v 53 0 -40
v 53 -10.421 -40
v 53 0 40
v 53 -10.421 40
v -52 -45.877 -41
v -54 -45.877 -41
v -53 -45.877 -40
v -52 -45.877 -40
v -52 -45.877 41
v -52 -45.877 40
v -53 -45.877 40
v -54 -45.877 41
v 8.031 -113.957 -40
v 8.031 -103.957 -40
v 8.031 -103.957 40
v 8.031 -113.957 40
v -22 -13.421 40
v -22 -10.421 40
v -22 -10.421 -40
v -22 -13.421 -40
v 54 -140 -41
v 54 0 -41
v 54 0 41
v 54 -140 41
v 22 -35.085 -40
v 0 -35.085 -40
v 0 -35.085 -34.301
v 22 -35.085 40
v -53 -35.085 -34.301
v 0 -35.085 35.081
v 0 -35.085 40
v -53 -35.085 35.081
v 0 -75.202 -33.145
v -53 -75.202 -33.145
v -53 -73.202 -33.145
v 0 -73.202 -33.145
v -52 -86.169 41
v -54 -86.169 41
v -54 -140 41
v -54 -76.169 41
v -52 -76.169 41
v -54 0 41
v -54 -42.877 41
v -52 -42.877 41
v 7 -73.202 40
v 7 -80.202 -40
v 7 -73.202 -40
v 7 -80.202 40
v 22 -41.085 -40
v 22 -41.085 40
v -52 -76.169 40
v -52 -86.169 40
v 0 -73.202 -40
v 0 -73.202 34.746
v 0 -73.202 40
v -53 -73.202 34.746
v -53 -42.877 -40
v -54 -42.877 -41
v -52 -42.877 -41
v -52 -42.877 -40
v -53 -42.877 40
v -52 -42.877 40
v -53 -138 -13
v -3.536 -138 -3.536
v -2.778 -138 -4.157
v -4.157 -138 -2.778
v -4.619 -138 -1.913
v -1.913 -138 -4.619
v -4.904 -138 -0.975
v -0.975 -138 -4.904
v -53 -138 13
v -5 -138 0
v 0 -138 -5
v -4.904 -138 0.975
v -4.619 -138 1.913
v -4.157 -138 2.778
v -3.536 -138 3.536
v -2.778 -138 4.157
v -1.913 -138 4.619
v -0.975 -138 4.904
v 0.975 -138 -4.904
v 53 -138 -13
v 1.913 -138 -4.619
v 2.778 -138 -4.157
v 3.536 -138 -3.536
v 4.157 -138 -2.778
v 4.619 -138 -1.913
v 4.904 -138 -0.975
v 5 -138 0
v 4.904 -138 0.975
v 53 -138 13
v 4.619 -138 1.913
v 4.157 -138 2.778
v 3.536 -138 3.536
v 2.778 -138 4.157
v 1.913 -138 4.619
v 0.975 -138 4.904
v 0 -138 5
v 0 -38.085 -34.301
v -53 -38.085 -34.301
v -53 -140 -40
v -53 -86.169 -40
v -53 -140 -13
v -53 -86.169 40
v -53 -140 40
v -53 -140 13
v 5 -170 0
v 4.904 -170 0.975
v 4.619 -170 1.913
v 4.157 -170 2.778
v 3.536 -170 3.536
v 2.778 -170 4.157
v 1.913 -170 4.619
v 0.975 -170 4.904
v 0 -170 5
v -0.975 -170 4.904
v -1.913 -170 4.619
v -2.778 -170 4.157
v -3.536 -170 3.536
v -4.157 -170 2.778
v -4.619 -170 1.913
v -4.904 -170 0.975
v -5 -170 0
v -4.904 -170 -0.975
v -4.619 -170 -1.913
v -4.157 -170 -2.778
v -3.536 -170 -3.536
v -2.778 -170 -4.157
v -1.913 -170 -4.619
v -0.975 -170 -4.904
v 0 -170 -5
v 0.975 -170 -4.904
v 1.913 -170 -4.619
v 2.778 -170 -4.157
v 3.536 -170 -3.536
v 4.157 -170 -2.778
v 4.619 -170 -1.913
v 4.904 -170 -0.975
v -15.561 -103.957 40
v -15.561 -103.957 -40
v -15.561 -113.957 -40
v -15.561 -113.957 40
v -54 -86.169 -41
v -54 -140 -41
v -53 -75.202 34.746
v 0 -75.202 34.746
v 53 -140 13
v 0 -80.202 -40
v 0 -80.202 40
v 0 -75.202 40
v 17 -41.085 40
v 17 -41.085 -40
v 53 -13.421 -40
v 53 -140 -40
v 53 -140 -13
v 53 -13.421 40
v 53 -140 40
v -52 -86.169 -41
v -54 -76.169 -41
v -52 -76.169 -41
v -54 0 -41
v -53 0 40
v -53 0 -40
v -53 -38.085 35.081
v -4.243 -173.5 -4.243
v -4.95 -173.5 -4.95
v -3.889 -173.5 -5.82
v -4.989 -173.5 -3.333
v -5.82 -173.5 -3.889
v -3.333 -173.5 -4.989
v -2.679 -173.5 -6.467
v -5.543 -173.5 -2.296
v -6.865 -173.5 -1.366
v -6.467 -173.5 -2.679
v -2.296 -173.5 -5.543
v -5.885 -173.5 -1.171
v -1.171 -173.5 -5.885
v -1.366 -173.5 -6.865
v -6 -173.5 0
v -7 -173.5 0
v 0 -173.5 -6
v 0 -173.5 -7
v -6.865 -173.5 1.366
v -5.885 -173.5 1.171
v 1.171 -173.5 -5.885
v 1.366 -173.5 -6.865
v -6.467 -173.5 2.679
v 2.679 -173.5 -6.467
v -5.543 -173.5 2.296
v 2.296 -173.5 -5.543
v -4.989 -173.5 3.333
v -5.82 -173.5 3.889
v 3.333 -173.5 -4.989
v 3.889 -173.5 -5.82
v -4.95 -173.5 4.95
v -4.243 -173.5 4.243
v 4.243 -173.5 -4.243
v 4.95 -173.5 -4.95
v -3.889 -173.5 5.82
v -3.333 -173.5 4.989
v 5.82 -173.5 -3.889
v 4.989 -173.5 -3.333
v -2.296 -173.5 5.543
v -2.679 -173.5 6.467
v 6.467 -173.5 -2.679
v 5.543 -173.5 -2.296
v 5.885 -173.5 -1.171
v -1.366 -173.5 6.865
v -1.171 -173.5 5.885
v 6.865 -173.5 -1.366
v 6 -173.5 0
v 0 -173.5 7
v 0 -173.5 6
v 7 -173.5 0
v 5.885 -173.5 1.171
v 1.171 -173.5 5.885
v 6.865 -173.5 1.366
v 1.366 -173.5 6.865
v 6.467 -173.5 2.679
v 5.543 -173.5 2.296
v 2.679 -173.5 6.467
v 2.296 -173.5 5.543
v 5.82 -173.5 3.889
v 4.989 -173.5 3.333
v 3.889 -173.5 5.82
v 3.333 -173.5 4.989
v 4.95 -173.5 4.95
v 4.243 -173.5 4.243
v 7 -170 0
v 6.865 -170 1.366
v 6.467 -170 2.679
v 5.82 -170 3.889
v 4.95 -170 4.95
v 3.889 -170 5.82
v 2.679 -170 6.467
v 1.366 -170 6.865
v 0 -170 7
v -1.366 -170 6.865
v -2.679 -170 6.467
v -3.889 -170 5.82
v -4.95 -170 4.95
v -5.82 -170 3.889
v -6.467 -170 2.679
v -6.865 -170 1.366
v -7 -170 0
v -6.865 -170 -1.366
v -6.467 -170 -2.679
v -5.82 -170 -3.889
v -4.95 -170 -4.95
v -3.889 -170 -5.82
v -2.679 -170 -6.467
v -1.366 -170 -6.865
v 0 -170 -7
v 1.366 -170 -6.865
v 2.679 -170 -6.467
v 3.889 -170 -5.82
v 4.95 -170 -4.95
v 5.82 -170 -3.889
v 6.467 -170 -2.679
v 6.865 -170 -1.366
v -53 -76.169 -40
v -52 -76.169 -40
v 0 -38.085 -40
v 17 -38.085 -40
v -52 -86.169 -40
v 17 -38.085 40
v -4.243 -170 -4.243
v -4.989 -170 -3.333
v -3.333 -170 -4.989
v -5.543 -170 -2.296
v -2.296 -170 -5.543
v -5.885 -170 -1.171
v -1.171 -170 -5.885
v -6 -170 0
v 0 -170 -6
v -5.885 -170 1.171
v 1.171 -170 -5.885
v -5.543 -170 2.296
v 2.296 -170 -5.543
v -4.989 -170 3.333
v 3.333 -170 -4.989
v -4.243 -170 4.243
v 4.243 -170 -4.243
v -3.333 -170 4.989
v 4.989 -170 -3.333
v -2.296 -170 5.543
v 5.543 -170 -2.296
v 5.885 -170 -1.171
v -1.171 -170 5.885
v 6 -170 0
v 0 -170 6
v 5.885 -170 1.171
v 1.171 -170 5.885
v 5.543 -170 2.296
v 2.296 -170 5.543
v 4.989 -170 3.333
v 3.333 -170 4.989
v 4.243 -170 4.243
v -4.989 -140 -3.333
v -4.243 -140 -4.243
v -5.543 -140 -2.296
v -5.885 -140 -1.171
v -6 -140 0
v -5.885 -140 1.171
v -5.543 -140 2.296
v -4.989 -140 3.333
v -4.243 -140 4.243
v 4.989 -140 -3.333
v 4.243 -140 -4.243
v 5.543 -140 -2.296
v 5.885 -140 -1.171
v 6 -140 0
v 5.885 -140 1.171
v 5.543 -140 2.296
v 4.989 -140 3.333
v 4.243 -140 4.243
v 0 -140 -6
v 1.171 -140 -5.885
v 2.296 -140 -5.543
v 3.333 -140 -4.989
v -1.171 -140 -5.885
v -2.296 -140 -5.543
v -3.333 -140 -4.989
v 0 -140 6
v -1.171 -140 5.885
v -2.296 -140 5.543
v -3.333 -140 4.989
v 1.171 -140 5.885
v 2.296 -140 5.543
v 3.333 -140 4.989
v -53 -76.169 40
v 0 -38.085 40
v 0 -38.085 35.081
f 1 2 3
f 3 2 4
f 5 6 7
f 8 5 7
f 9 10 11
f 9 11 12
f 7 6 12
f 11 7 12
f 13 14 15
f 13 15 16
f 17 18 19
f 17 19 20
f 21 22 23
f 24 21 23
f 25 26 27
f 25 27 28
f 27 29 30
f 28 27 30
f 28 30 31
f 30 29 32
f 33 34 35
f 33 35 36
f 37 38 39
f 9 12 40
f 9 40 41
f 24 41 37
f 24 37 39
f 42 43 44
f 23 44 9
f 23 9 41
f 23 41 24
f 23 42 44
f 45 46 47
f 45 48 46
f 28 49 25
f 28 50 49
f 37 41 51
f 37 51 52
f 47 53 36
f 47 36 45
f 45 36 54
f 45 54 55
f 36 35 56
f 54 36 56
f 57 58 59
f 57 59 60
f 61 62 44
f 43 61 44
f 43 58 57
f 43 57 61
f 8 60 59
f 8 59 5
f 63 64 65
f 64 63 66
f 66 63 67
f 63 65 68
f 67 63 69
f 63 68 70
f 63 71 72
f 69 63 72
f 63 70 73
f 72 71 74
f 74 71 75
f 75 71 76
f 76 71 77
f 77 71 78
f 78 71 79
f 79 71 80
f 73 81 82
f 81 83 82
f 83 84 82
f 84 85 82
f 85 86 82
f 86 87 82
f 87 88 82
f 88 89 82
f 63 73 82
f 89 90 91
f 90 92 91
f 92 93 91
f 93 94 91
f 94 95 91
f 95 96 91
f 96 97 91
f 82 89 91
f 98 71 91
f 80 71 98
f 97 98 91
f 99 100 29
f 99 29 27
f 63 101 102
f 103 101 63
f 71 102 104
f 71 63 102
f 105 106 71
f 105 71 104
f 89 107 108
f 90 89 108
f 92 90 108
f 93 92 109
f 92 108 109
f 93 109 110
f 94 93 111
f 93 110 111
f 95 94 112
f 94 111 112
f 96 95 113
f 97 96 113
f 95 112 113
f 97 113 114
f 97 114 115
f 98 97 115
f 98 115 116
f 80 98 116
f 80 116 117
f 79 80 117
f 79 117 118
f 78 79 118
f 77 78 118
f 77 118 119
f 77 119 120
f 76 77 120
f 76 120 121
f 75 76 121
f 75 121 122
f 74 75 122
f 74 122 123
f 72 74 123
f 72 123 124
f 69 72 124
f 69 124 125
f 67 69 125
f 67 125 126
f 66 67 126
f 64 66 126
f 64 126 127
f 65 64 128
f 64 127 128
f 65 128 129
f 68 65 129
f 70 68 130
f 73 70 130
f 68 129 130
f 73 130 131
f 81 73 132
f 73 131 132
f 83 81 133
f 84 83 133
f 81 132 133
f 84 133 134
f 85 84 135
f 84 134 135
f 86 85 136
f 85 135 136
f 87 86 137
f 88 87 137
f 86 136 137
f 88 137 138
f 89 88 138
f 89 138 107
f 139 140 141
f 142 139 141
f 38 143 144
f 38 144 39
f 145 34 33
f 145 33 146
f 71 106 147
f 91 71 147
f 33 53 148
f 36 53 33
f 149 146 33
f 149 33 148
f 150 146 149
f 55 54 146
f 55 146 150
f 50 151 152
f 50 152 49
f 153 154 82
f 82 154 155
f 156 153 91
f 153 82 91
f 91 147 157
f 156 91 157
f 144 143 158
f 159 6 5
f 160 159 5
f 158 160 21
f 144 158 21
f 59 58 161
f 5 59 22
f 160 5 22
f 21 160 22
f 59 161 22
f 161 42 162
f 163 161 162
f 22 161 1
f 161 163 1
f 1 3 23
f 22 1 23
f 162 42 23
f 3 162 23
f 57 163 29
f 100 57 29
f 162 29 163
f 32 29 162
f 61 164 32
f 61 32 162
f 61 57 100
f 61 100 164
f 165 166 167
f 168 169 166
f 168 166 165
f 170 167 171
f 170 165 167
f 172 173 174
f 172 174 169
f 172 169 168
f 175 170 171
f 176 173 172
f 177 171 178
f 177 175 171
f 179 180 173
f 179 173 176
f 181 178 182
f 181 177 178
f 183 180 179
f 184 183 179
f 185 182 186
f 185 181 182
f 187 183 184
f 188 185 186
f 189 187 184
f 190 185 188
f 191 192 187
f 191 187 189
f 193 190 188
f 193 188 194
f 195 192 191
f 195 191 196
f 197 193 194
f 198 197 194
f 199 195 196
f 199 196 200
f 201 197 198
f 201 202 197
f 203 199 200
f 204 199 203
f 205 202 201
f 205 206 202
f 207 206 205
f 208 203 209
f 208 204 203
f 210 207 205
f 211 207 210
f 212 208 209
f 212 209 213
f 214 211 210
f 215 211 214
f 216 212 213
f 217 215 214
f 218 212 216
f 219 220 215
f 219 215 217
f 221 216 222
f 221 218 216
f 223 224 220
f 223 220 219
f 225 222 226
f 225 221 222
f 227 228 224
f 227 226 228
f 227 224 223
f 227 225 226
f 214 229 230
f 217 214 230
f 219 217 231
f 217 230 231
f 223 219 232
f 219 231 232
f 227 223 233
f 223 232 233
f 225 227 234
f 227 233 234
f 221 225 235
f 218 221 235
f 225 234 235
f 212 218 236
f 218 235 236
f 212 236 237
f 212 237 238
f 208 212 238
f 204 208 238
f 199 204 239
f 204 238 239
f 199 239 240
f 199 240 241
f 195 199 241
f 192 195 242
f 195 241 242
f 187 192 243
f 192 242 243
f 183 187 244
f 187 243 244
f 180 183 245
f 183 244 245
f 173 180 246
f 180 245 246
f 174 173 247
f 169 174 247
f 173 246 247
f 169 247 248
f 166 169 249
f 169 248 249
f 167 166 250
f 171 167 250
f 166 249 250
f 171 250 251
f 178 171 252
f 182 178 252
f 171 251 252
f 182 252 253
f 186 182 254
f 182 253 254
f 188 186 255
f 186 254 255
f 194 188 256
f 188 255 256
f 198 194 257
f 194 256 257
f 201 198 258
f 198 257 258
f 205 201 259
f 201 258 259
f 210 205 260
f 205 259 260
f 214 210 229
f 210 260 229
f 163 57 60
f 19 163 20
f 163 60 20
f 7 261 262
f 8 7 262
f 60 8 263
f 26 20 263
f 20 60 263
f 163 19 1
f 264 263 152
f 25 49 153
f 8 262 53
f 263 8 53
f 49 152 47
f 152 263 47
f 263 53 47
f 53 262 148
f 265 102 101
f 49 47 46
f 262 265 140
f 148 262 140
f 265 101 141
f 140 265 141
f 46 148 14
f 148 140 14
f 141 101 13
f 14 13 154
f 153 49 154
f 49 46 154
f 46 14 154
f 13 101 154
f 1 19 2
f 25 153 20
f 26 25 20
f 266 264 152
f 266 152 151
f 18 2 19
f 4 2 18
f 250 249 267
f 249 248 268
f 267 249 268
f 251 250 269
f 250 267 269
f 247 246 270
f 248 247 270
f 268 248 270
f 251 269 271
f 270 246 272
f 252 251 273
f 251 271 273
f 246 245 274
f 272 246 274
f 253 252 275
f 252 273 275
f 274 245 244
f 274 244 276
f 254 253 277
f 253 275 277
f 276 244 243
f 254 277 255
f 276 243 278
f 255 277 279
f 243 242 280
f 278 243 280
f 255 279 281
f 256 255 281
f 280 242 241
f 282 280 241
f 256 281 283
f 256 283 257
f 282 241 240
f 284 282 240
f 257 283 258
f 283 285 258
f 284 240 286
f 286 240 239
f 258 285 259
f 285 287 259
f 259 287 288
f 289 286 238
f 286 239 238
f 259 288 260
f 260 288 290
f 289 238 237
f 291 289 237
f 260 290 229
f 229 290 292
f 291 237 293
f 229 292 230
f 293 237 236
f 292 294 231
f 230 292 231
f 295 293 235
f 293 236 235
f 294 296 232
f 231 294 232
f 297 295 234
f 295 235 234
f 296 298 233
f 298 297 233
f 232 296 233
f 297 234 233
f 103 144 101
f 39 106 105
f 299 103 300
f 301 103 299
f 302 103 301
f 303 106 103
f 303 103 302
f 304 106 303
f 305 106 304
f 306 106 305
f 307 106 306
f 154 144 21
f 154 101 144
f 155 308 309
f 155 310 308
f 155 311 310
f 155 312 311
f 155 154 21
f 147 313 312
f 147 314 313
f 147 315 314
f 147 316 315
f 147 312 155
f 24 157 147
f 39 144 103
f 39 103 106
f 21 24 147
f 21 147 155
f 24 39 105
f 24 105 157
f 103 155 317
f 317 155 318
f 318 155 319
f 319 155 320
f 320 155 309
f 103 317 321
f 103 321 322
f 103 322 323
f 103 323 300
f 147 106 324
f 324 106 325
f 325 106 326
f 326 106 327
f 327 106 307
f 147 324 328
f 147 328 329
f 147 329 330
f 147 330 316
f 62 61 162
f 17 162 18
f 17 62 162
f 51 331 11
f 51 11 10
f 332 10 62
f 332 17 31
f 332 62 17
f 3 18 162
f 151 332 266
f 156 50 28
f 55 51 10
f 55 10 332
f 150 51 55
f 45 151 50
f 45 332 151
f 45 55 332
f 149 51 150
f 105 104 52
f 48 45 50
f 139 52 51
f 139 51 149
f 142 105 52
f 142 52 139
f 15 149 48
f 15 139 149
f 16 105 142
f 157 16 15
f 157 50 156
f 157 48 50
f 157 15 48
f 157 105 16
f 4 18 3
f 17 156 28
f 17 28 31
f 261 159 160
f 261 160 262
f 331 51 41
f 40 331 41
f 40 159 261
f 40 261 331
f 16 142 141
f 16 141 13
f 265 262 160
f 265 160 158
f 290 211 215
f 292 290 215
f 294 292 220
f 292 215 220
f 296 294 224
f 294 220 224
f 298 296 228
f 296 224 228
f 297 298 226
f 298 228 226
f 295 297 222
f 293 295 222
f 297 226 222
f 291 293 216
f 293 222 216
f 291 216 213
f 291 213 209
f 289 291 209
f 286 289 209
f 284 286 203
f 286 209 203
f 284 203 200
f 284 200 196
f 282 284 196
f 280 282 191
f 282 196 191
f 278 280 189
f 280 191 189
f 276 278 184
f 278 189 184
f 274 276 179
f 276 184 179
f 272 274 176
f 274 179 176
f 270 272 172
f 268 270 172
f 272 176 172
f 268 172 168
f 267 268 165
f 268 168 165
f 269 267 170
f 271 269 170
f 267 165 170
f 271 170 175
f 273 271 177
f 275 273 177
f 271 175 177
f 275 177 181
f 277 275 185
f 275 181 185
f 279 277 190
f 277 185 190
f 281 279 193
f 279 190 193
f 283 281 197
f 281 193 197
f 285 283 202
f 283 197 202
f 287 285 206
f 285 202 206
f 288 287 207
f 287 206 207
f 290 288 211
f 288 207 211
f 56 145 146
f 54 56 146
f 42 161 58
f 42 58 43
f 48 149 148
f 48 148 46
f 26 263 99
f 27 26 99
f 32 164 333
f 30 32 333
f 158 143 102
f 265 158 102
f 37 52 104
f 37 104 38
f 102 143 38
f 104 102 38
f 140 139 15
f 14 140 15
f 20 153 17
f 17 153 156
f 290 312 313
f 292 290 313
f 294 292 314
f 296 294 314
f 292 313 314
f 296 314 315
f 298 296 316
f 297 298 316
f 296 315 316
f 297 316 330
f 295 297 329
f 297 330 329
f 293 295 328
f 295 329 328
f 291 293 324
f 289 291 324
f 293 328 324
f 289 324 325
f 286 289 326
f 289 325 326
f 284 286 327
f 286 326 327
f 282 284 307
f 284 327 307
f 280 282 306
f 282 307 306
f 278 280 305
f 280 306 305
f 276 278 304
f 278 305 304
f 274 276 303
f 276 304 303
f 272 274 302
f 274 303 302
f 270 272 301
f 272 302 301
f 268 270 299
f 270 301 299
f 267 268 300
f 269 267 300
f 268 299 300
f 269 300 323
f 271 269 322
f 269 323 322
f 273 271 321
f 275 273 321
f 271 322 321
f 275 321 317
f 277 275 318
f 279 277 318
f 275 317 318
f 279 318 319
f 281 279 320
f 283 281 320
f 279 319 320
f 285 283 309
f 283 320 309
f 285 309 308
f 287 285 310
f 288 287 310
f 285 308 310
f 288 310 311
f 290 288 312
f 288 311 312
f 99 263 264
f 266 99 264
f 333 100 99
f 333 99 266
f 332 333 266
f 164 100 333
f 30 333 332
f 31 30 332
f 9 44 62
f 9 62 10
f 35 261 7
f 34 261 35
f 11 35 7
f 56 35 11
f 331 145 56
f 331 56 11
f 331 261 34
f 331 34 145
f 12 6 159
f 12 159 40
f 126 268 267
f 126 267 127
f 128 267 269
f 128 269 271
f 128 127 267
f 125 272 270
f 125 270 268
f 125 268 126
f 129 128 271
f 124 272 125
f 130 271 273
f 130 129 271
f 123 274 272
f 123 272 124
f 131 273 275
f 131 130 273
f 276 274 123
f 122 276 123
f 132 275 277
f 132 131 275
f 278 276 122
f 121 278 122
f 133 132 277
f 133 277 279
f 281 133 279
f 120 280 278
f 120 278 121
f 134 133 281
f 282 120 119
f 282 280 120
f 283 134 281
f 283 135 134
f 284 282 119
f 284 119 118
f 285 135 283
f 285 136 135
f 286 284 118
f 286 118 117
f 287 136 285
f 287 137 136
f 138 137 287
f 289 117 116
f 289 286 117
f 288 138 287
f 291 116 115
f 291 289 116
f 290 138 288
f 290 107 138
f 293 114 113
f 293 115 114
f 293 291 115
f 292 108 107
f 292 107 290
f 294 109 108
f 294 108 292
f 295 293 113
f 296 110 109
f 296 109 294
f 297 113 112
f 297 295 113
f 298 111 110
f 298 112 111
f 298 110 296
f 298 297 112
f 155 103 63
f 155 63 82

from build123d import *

# Parameters (mm, degrees)
F0_W      = 108
F0_H      = 82
F1_DEPTH  = 140
F2_W      = 106
F2_H      = 80
F3_DEPTH  = 140
F4_W      = 2
F4_H      = 80
F5_DEPTH  = 60
F6_W      = 7
F6_H      = 80
F7_DEPTH  = 5
F8_W      = 53
F8_H      = 5.2541689575
F9_DEPTH  = 5
F10_W     = 53
F10_H     = 6.8548367918
F11_DEPTH = 25
F12_W     = 10
F12_H     = 82
F13_DEPTH = 2
F14_W     = 3
F14_H     = 80
F15_DEPTH = 75
F16_W     = 5
F16_H     = 80
F17_DEPTH = 3
F18_W     = 3
F18_H     = 82
F19_DEPTH = 2
F20_W     = 53
F20_H     = 5.699147433
F20_H_2   = 4.9193547666
F21_DEPTH = 25
F22_W     = 3
F22_H     = 80
F23_DEPTH = 75
F24_W     = 23.5925841301
F24_H     = 10
F25_DEPTH = 80
F26_W     = 106
F26_H     = 26
F27_DEPTH = 2
F28_R     = 6
F29_DEPTH = 30
F30_R     = 5
F31_DEPTH = 40
F32_R     = 7
F33_DEPTH = 3.5
F34_R     = 6
F35_DEPTH = 3.5


with BuildPart() as f1:
    # F0 (on Front) → F1 (new body)
    with BuildSketch(Plane.XZ):
        Rectangle(F0_W, F0_H)
    extrude(amount=F1_DEPTH)

    # F2 (on face) → F3 (cut, through all)
    with BuildSketch(Plane.XZ.offset(140)):
        Rectangle(F2_W, F2_H)
    extrude(amount=-F3_DEPTH, mode=Mode.SUBTRACT)

    # F4 (on face) → F5 (join)
    with BuildSketch(Plane.YZ.offset(-53)):
        with Locations((-74.2016156912, 0)):
            Rectangle(F4_W, F4_H)
    extrude(amount=F5_DEPTH)

    # F6 (on face) → F7 (join)
    with BuildSketch(Plane.XZ.offset(75.2016156912)):
        with Locations((3.5, 0)):
            Rectangle(F6_W, F6_H)
    extrude(amount=F7_DEPTH)

    # F8 (on face) → F9 (cut)
    with BuildSketch(Plane.XZ.offset(75.2016156912)):
        with Locations((-26.5, 37.3729155213)):
            Rectangle(F8_W, F8_H)
    extrude(amount=-F9_DEPTH, mode=Mode.SUBTRACT)

    # F10 (on face) → F11 (cut)
    with BuildSketch(Plane.XZ.offset(75.2016156912)):
        with Locations((-26.5, -36.5725816041)):
            Rectangle(F10_W, F10_H)
    extrude(amount=-F11_DEPTH, mode=Mode.SUBTRACT)

    # F12 (on face) → F13 (cut)
    with BuildSketch(Plane(origin=(-54, 0, 0), x_dir=(0, -1, 0), z_dir=(-1, 0, 0))):
        with Locations((81.1693567038, 0)):
            Rectangle(F12_W, F12_H)
    extrude(amount=-F13_DEPTH, mode=Mode.SUBTRACT)

    # F14 (on face) → F15 (join)
    with BuildSketch(Plane.YZ.offset(-53)):
        with Locations((-36.5846783519, 0)):
            Rectangle(F14_W, F14_H)
    extrude(amount=F15_DEPTH)

    # F16 (on face) → F17 (join)
    with BuildSketch(Plane.XZ.offset(38.0846783519)):
        with Locations((19.5, 0)):
            Rectangle(F16_W, F16_H)
    extrude(amount=F17_DEPTH)

    # F18 (on face) → F19 (cut)
    with BuildSketch(Plane(origin=(-54, 0, 0), x_dir=(0, -1, 0), z_dir=(-1, 0, 0))):
        with Locations((44.3771749139, 0)):
            Rectangle(F18_W, F18_H)
    extrude(amount=-F19_DEPTH, mode=Mode.SUBTRACT)

    # F20 (on face) → F21 (cut)
    with BuildSketch(Plane.XZ.offset(38.0846783519)):
        with Locations((-26.5, -37.1504262835)):
            Rectangle(F20_W, F20_H)
        with Locations((-26.5, 37.5403226167)):
            Rectangle(F20_W, F20_H_2)
    extrude(amount=-F21_DEPTH, mode=Mode.SUBTRACT)

    # F22 (on face) → F23 (join)
    with BuildSketch(Plane(origin=(53, 0, 0), x_dir=(0, -1, 0), z_dir=(-1, 0, 0))):
        with Locations((11.9209491983, 0)):
            Rectangle(F22_W, F22_H)
    extrude(amount=F23_DEPTH)

    # F24 (on face) → F25 (join, through all)
    with BuildSketch(Plane(origin=(0, 0, 40), x_dir=(1, 0, 0), z_dir=(0, 0, -1))):
        with Locations((-3.7651341408, 108.9572943747)):
            Rectangle(F24_W, F24_H)
    extrude(amount=F25_DEPTH)

    # F26 (on face) → F27 (join)
    with BuildSketch(Plane.XZ.offset(140)):
        Rectangle(F26_W, F26_H)
    extrude(amount=-F27_DEPTH)

    # F28 (on face) → F29 (join)
    with BuildSketch(Plane.XZ.offset(140)):
        Circle(F28_R)
    extrude(amount=F29_DEPTH)

    # F30 (on face) → F31 (cut)
    with BuildSketch(Plane.XZ.offset(170)):
        Circle(F30_R)
    extrude(amount=-F31_DEPTH, mode=Mode.SUBTRACT)

    # F32 (on face) → F33 (join)
    with BuildSketch(Plane.XZ.offset(170)):
        Circle(F32_R)
    extrude(amount=F33_DEPTH)

    # F34 (on face) → F35 (cut)
    with BuildSketch(Plane.XZ.offset(173.5)):
        Circle(F34_R)
    extrude(amount=-F35_DEPTH, mode=Mode.SUBTRACT)


solid = f1.part
